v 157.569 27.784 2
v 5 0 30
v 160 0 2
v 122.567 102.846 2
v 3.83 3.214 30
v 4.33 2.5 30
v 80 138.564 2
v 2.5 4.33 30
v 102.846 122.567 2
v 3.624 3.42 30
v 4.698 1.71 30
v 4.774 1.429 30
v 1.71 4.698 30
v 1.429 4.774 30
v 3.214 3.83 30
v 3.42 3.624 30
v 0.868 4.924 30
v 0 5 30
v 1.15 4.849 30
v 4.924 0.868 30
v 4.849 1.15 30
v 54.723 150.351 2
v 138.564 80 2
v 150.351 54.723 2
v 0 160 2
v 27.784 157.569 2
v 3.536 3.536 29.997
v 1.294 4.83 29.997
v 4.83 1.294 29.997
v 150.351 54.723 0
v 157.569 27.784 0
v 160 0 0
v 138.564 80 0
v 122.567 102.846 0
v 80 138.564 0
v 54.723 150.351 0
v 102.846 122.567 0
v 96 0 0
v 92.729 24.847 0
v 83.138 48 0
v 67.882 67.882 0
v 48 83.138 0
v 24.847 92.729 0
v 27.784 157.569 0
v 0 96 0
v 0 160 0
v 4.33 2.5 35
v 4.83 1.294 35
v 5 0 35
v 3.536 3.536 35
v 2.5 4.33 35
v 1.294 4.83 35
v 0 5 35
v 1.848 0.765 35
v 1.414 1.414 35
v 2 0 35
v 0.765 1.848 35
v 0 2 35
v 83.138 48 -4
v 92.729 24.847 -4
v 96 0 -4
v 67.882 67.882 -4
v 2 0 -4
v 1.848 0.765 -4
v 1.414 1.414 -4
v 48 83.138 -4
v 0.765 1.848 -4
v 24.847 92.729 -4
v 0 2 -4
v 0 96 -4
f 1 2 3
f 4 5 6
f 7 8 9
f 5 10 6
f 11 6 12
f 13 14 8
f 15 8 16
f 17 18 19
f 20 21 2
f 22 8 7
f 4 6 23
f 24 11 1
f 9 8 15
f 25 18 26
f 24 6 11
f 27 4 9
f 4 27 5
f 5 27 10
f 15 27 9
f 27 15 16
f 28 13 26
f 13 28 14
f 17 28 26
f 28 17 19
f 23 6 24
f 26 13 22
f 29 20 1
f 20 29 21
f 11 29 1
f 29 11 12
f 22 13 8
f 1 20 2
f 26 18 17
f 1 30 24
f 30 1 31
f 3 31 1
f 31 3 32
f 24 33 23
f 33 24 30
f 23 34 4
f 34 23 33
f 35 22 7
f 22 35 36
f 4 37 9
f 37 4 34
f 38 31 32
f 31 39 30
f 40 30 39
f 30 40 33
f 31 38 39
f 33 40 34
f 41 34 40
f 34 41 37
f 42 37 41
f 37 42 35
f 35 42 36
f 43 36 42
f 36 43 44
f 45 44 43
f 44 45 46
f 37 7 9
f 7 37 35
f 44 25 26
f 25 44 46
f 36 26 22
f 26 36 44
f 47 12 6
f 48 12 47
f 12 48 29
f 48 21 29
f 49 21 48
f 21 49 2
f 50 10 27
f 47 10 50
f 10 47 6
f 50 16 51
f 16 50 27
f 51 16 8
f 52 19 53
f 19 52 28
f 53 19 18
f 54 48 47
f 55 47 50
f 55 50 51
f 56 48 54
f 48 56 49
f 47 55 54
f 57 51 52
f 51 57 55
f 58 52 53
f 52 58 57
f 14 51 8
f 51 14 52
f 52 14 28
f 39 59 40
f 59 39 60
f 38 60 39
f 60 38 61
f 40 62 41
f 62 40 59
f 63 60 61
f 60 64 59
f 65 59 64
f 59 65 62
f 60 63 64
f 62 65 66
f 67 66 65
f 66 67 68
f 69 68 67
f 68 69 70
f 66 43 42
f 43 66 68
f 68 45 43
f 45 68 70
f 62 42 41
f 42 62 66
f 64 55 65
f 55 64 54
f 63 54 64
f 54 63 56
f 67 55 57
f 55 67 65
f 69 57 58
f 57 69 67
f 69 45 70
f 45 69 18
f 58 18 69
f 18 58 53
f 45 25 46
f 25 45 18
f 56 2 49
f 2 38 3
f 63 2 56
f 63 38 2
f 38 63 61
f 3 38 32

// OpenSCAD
//
// The Chimnea Cover
//
// The 320mm diameter of the cover is too much for most printers.
// We print this in segments, then glue it all together.

top_dia = 10.0;

// The bottom is wide enough to cover the whole mouth of the chimnea.
wide_dia = 320.0;

ring_fn = 24;
ring_dia = 200.0;
tab_dia_bot = ring_dia - 8.0;

// The main height is of the cone itself only, without the locking tabs.
// We could have some formula, like wide_dia*0.1, but let's be simple.
height = 30.0;
tab_h_top = 5.0;
tab_h_bot = 4.0;

// The main body without any subtractions.
module mold () {

    // The main cone.
    translate([0, 0, 2.0])
        cylinder(height - 2.0, wide_dia/2, top_dia/2, $fn=36);

    // Botom plate to avoid a sharp outer edge.
    cylinder(2.0, wide_dia/2, wide_dia/2, $fn=36);

    // Top locking tab.
    cylinder(height + tab_h_top, top_dia/2, top_dia/2, $fn=24);

    // Bottom locking tab is actually a very large ring.
    translate([0, 0, tab_h_bot*-1])
        cylinder(tab_h_bot, tab_dia_bot/2, tab_dia_bot/2, $fn=ring_fn);
}

module main () {

    intersection () {

        difference () {
            mold();

            // This tiny center hole helps to assemble segments.
            translate([0, 0, (tab_h_bot + 0.1)*-1])
                cylinder(height + tab_h_bot + tab_h_top + 0.2, r=2.0, $fn=16);
        }

        translate([0, 0, (tab_h_bot + 0.1)*-1])
            cube([wide_dia/2, wide_dia/2,
                  height + tab_h_bot + tab_h_top + 0.2]);
    }
}

main();
